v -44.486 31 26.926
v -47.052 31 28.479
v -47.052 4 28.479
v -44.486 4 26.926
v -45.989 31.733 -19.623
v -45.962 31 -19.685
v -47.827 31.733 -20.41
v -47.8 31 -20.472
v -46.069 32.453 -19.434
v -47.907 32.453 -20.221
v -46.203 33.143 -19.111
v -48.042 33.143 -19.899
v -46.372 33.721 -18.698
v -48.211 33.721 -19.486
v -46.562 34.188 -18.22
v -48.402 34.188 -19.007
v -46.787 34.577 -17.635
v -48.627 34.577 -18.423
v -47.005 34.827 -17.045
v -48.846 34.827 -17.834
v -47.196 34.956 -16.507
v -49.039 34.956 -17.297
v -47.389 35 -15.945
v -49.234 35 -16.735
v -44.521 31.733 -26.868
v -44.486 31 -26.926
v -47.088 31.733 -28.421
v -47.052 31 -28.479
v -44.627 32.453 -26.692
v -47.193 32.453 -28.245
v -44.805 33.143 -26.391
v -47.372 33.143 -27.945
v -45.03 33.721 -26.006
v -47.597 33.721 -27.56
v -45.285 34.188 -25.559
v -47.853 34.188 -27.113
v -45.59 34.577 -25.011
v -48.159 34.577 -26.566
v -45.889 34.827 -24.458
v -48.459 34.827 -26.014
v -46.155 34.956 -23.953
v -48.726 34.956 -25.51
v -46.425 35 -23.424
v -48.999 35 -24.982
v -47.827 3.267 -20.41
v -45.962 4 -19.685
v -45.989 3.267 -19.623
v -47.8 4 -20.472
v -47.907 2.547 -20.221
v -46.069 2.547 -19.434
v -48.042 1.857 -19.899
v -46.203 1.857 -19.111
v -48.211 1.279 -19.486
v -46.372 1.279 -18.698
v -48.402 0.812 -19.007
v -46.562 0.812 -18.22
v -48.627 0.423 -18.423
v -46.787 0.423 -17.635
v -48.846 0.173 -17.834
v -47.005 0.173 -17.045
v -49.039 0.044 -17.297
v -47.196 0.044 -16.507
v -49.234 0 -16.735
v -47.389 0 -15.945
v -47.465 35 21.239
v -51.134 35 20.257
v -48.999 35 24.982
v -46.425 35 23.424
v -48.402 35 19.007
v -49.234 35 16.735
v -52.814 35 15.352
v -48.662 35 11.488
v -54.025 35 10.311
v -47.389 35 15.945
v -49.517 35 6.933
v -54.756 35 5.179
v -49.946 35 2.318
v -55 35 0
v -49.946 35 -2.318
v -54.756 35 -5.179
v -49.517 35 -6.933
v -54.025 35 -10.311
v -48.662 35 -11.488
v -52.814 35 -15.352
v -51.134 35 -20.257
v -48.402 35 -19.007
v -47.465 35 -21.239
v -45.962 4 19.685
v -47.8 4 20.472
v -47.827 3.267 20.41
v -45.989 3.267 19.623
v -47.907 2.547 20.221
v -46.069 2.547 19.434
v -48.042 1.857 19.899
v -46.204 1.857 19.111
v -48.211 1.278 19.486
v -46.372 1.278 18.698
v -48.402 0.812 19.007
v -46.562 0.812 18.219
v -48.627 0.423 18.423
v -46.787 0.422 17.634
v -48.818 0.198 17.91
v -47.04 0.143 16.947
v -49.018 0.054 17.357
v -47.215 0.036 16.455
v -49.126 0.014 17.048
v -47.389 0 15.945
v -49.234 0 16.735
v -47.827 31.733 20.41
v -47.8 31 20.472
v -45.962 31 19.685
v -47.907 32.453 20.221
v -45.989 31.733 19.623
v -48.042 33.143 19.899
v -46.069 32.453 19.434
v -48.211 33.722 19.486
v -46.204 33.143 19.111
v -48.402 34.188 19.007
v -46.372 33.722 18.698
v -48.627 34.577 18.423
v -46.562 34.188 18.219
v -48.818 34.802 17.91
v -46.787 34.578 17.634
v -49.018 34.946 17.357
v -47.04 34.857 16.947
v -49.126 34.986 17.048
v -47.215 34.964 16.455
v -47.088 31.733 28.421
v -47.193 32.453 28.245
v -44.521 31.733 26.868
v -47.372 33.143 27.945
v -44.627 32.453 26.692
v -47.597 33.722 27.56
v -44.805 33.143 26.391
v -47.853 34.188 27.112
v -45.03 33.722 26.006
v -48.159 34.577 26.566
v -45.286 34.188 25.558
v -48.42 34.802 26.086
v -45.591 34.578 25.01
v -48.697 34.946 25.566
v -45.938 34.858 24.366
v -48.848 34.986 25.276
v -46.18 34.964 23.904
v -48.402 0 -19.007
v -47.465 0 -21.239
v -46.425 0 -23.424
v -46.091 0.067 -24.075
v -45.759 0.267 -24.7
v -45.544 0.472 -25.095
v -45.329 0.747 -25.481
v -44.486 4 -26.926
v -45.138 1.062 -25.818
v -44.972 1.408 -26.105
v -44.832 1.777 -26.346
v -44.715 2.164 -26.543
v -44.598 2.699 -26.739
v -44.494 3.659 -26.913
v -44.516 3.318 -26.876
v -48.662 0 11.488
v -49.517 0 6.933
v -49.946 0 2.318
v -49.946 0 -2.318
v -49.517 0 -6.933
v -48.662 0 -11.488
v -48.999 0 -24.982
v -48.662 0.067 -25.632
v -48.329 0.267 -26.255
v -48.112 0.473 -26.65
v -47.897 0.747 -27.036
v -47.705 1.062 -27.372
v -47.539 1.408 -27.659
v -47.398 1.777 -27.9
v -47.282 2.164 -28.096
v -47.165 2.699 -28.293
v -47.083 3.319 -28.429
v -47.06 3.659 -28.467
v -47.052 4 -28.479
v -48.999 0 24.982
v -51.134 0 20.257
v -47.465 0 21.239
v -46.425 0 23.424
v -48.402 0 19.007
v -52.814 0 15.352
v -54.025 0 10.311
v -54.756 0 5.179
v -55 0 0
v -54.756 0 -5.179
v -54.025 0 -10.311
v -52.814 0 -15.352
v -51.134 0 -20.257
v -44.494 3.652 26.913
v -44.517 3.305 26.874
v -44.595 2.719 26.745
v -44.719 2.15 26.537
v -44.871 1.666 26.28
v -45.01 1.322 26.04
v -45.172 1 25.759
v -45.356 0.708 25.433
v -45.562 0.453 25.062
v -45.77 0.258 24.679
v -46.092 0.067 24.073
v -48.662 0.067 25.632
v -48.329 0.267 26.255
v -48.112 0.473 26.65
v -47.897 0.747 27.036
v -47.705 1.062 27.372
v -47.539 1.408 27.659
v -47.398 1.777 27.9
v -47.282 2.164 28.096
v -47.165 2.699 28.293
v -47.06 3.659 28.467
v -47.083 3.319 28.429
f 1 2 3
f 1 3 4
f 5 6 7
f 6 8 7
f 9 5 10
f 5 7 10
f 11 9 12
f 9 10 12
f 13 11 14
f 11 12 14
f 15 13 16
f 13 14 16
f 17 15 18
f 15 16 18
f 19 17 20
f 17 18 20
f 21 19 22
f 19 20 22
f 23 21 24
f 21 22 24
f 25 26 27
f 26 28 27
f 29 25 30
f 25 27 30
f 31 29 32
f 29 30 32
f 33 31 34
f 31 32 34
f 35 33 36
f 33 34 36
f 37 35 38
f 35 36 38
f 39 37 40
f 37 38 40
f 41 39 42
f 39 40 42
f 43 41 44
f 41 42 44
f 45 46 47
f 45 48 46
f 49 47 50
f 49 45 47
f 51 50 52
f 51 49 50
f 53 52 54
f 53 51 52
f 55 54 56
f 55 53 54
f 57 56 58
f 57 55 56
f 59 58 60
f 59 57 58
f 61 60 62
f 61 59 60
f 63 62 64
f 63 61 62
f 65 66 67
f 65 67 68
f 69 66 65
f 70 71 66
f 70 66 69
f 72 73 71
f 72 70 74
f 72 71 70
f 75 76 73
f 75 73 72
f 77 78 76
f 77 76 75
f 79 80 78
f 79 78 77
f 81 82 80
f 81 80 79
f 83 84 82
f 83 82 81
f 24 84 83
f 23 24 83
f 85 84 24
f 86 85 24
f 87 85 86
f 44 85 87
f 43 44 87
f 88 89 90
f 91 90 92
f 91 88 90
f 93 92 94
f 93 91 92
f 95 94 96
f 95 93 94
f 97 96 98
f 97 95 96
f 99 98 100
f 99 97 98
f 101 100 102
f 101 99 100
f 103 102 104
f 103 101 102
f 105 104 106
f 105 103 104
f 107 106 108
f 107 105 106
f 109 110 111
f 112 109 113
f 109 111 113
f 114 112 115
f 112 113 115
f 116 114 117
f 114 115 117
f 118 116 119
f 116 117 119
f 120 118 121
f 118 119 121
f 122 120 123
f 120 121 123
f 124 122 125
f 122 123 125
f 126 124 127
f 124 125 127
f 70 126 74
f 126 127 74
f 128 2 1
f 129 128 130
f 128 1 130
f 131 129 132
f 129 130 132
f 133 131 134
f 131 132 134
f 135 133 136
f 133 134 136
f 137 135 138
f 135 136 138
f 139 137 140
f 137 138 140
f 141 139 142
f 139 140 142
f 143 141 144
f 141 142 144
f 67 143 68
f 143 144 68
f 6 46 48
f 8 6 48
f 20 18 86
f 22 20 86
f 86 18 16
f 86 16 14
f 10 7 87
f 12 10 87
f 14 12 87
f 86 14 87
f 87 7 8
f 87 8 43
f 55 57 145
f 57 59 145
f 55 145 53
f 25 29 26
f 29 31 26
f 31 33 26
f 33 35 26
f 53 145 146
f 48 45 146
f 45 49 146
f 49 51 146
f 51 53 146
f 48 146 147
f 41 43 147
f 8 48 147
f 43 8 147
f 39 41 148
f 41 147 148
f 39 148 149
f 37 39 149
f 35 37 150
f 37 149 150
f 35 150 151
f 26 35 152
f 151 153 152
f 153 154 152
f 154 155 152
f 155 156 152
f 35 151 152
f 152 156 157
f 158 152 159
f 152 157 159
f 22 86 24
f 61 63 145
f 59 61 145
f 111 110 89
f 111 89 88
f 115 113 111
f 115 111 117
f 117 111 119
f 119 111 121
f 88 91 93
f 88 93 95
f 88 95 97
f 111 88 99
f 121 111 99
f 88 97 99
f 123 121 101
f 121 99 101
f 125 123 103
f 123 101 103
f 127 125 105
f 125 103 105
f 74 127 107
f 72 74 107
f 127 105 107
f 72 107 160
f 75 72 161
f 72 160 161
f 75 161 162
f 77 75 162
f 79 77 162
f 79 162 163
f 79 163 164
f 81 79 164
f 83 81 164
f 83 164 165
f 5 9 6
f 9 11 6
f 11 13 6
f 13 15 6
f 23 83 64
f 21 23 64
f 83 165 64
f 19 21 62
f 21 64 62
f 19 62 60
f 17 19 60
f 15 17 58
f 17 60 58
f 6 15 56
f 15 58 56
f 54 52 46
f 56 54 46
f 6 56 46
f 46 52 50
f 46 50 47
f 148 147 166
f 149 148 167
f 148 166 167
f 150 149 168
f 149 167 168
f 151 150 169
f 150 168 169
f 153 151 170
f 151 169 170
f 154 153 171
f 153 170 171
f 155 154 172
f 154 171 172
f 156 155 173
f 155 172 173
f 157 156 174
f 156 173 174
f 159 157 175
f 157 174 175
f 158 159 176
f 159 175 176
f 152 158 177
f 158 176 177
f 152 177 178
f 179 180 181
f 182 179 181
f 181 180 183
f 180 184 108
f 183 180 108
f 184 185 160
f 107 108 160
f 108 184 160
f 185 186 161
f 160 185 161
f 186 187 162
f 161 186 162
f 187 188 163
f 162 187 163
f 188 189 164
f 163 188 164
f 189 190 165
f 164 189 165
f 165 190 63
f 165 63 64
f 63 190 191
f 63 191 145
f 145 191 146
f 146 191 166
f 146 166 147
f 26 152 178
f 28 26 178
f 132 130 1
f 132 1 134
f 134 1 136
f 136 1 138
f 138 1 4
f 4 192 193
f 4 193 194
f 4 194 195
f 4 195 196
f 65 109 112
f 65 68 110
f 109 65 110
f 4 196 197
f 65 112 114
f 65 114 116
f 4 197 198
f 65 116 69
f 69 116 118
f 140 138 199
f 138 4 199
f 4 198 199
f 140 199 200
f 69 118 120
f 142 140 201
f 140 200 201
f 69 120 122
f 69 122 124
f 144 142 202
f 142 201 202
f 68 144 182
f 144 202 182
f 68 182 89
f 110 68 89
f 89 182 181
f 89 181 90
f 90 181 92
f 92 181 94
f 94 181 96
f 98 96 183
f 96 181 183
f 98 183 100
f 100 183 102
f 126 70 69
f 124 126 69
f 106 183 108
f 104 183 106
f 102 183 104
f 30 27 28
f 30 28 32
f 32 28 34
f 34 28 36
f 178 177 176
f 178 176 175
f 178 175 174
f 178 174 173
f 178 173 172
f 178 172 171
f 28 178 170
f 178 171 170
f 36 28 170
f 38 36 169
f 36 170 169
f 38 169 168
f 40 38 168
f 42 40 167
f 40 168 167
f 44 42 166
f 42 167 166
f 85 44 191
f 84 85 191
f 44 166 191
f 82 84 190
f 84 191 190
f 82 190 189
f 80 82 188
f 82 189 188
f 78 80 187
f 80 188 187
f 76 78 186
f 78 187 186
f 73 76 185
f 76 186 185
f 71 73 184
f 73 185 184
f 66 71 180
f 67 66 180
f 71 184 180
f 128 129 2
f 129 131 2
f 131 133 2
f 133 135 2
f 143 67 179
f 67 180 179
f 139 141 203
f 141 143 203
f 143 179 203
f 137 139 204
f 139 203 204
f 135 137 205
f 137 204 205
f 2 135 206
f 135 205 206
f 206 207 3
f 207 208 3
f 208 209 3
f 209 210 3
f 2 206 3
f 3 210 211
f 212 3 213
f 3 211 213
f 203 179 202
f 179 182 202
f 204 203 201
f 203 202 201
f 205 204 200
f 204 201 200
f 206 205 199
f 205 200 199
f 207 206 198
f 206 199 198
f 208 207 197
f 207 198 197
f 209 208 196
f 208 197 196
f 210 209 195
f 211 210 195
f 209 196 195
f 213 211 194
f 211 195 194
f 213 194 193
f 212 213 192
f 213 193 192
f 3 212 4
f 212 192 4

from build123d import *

# Parameters (mm, degrees)
BOSS_EXTRUDE1_DEPTH = 35
FILLET1_R           = 4
FILLET2_R           = 4


with BuildPart() as part:
    # Sketch1 → Boss-Extrude1 (new body)
    with BuildSketch(Plane(origin=(0, 0, 0), x_dir=(1, 0, 0), z_dir=(0, 1, 0))):
        with BuildLine():
            Line((-45.961922075, 19.685063351), (-47.800398958, 20.472465885))
            ThreePointArc((-47.800398958, 20.472465885), (-46.25587256, 23.756983262), (-44.4859922, 26.925759005))
            Line((-44.4859922, 26.925759005), (-47.05249175, 28.479168178))
            ThreePointArc((-47.05249175, 28.479168178), (-55, 0), (-47.05249175, -28.479168178))
            Line((-47.05249175, -28.479168178), (-44.4859922, -26.925759005))
            ThreePointArc((-44.4859922, -26.925759005), (-46.25587256, -23.756983262), (-47.800398958, -20.472465885))
            Line((-47.800398958, -20.472465885), (-45.961922075, -19.685063351))
            ThreePointArc((-45.961922075, -19.685063351), (-50, 0), (-45.961922075, 19.685063351))
        make_face()
    extrude(amount=BOSS_EXTRUDE1_DEPTH)

    # Fillet1
    fillet1_edges = [part.edges().sort_by_distance(p)[0] for p in [
        (-46.881160517, 0, -20.078764618),
        (-46.881160517, 0, 20.078764618),
        (-46.881160517, 35, 20.078764618),
        (-46.881160517, 35, -20.078764618),
    ]]
    fillet(fillet1_edges, radius=FILLET1_R)

    # Fillet2
    fillet2_edges = [part.edges().sort_by_distance(p)[0] for p in [
        (-45.769241975, 0, 27.702463591),
        (-45.769241975, 0, -27.702463591),
        (-45.769241975, 35, 27.702463591),
        (-45.769241975, 35, -27.702463591),
    ]]
    fillet(fillet2_edges, radius=FILLET2_R)


solid = part.part
